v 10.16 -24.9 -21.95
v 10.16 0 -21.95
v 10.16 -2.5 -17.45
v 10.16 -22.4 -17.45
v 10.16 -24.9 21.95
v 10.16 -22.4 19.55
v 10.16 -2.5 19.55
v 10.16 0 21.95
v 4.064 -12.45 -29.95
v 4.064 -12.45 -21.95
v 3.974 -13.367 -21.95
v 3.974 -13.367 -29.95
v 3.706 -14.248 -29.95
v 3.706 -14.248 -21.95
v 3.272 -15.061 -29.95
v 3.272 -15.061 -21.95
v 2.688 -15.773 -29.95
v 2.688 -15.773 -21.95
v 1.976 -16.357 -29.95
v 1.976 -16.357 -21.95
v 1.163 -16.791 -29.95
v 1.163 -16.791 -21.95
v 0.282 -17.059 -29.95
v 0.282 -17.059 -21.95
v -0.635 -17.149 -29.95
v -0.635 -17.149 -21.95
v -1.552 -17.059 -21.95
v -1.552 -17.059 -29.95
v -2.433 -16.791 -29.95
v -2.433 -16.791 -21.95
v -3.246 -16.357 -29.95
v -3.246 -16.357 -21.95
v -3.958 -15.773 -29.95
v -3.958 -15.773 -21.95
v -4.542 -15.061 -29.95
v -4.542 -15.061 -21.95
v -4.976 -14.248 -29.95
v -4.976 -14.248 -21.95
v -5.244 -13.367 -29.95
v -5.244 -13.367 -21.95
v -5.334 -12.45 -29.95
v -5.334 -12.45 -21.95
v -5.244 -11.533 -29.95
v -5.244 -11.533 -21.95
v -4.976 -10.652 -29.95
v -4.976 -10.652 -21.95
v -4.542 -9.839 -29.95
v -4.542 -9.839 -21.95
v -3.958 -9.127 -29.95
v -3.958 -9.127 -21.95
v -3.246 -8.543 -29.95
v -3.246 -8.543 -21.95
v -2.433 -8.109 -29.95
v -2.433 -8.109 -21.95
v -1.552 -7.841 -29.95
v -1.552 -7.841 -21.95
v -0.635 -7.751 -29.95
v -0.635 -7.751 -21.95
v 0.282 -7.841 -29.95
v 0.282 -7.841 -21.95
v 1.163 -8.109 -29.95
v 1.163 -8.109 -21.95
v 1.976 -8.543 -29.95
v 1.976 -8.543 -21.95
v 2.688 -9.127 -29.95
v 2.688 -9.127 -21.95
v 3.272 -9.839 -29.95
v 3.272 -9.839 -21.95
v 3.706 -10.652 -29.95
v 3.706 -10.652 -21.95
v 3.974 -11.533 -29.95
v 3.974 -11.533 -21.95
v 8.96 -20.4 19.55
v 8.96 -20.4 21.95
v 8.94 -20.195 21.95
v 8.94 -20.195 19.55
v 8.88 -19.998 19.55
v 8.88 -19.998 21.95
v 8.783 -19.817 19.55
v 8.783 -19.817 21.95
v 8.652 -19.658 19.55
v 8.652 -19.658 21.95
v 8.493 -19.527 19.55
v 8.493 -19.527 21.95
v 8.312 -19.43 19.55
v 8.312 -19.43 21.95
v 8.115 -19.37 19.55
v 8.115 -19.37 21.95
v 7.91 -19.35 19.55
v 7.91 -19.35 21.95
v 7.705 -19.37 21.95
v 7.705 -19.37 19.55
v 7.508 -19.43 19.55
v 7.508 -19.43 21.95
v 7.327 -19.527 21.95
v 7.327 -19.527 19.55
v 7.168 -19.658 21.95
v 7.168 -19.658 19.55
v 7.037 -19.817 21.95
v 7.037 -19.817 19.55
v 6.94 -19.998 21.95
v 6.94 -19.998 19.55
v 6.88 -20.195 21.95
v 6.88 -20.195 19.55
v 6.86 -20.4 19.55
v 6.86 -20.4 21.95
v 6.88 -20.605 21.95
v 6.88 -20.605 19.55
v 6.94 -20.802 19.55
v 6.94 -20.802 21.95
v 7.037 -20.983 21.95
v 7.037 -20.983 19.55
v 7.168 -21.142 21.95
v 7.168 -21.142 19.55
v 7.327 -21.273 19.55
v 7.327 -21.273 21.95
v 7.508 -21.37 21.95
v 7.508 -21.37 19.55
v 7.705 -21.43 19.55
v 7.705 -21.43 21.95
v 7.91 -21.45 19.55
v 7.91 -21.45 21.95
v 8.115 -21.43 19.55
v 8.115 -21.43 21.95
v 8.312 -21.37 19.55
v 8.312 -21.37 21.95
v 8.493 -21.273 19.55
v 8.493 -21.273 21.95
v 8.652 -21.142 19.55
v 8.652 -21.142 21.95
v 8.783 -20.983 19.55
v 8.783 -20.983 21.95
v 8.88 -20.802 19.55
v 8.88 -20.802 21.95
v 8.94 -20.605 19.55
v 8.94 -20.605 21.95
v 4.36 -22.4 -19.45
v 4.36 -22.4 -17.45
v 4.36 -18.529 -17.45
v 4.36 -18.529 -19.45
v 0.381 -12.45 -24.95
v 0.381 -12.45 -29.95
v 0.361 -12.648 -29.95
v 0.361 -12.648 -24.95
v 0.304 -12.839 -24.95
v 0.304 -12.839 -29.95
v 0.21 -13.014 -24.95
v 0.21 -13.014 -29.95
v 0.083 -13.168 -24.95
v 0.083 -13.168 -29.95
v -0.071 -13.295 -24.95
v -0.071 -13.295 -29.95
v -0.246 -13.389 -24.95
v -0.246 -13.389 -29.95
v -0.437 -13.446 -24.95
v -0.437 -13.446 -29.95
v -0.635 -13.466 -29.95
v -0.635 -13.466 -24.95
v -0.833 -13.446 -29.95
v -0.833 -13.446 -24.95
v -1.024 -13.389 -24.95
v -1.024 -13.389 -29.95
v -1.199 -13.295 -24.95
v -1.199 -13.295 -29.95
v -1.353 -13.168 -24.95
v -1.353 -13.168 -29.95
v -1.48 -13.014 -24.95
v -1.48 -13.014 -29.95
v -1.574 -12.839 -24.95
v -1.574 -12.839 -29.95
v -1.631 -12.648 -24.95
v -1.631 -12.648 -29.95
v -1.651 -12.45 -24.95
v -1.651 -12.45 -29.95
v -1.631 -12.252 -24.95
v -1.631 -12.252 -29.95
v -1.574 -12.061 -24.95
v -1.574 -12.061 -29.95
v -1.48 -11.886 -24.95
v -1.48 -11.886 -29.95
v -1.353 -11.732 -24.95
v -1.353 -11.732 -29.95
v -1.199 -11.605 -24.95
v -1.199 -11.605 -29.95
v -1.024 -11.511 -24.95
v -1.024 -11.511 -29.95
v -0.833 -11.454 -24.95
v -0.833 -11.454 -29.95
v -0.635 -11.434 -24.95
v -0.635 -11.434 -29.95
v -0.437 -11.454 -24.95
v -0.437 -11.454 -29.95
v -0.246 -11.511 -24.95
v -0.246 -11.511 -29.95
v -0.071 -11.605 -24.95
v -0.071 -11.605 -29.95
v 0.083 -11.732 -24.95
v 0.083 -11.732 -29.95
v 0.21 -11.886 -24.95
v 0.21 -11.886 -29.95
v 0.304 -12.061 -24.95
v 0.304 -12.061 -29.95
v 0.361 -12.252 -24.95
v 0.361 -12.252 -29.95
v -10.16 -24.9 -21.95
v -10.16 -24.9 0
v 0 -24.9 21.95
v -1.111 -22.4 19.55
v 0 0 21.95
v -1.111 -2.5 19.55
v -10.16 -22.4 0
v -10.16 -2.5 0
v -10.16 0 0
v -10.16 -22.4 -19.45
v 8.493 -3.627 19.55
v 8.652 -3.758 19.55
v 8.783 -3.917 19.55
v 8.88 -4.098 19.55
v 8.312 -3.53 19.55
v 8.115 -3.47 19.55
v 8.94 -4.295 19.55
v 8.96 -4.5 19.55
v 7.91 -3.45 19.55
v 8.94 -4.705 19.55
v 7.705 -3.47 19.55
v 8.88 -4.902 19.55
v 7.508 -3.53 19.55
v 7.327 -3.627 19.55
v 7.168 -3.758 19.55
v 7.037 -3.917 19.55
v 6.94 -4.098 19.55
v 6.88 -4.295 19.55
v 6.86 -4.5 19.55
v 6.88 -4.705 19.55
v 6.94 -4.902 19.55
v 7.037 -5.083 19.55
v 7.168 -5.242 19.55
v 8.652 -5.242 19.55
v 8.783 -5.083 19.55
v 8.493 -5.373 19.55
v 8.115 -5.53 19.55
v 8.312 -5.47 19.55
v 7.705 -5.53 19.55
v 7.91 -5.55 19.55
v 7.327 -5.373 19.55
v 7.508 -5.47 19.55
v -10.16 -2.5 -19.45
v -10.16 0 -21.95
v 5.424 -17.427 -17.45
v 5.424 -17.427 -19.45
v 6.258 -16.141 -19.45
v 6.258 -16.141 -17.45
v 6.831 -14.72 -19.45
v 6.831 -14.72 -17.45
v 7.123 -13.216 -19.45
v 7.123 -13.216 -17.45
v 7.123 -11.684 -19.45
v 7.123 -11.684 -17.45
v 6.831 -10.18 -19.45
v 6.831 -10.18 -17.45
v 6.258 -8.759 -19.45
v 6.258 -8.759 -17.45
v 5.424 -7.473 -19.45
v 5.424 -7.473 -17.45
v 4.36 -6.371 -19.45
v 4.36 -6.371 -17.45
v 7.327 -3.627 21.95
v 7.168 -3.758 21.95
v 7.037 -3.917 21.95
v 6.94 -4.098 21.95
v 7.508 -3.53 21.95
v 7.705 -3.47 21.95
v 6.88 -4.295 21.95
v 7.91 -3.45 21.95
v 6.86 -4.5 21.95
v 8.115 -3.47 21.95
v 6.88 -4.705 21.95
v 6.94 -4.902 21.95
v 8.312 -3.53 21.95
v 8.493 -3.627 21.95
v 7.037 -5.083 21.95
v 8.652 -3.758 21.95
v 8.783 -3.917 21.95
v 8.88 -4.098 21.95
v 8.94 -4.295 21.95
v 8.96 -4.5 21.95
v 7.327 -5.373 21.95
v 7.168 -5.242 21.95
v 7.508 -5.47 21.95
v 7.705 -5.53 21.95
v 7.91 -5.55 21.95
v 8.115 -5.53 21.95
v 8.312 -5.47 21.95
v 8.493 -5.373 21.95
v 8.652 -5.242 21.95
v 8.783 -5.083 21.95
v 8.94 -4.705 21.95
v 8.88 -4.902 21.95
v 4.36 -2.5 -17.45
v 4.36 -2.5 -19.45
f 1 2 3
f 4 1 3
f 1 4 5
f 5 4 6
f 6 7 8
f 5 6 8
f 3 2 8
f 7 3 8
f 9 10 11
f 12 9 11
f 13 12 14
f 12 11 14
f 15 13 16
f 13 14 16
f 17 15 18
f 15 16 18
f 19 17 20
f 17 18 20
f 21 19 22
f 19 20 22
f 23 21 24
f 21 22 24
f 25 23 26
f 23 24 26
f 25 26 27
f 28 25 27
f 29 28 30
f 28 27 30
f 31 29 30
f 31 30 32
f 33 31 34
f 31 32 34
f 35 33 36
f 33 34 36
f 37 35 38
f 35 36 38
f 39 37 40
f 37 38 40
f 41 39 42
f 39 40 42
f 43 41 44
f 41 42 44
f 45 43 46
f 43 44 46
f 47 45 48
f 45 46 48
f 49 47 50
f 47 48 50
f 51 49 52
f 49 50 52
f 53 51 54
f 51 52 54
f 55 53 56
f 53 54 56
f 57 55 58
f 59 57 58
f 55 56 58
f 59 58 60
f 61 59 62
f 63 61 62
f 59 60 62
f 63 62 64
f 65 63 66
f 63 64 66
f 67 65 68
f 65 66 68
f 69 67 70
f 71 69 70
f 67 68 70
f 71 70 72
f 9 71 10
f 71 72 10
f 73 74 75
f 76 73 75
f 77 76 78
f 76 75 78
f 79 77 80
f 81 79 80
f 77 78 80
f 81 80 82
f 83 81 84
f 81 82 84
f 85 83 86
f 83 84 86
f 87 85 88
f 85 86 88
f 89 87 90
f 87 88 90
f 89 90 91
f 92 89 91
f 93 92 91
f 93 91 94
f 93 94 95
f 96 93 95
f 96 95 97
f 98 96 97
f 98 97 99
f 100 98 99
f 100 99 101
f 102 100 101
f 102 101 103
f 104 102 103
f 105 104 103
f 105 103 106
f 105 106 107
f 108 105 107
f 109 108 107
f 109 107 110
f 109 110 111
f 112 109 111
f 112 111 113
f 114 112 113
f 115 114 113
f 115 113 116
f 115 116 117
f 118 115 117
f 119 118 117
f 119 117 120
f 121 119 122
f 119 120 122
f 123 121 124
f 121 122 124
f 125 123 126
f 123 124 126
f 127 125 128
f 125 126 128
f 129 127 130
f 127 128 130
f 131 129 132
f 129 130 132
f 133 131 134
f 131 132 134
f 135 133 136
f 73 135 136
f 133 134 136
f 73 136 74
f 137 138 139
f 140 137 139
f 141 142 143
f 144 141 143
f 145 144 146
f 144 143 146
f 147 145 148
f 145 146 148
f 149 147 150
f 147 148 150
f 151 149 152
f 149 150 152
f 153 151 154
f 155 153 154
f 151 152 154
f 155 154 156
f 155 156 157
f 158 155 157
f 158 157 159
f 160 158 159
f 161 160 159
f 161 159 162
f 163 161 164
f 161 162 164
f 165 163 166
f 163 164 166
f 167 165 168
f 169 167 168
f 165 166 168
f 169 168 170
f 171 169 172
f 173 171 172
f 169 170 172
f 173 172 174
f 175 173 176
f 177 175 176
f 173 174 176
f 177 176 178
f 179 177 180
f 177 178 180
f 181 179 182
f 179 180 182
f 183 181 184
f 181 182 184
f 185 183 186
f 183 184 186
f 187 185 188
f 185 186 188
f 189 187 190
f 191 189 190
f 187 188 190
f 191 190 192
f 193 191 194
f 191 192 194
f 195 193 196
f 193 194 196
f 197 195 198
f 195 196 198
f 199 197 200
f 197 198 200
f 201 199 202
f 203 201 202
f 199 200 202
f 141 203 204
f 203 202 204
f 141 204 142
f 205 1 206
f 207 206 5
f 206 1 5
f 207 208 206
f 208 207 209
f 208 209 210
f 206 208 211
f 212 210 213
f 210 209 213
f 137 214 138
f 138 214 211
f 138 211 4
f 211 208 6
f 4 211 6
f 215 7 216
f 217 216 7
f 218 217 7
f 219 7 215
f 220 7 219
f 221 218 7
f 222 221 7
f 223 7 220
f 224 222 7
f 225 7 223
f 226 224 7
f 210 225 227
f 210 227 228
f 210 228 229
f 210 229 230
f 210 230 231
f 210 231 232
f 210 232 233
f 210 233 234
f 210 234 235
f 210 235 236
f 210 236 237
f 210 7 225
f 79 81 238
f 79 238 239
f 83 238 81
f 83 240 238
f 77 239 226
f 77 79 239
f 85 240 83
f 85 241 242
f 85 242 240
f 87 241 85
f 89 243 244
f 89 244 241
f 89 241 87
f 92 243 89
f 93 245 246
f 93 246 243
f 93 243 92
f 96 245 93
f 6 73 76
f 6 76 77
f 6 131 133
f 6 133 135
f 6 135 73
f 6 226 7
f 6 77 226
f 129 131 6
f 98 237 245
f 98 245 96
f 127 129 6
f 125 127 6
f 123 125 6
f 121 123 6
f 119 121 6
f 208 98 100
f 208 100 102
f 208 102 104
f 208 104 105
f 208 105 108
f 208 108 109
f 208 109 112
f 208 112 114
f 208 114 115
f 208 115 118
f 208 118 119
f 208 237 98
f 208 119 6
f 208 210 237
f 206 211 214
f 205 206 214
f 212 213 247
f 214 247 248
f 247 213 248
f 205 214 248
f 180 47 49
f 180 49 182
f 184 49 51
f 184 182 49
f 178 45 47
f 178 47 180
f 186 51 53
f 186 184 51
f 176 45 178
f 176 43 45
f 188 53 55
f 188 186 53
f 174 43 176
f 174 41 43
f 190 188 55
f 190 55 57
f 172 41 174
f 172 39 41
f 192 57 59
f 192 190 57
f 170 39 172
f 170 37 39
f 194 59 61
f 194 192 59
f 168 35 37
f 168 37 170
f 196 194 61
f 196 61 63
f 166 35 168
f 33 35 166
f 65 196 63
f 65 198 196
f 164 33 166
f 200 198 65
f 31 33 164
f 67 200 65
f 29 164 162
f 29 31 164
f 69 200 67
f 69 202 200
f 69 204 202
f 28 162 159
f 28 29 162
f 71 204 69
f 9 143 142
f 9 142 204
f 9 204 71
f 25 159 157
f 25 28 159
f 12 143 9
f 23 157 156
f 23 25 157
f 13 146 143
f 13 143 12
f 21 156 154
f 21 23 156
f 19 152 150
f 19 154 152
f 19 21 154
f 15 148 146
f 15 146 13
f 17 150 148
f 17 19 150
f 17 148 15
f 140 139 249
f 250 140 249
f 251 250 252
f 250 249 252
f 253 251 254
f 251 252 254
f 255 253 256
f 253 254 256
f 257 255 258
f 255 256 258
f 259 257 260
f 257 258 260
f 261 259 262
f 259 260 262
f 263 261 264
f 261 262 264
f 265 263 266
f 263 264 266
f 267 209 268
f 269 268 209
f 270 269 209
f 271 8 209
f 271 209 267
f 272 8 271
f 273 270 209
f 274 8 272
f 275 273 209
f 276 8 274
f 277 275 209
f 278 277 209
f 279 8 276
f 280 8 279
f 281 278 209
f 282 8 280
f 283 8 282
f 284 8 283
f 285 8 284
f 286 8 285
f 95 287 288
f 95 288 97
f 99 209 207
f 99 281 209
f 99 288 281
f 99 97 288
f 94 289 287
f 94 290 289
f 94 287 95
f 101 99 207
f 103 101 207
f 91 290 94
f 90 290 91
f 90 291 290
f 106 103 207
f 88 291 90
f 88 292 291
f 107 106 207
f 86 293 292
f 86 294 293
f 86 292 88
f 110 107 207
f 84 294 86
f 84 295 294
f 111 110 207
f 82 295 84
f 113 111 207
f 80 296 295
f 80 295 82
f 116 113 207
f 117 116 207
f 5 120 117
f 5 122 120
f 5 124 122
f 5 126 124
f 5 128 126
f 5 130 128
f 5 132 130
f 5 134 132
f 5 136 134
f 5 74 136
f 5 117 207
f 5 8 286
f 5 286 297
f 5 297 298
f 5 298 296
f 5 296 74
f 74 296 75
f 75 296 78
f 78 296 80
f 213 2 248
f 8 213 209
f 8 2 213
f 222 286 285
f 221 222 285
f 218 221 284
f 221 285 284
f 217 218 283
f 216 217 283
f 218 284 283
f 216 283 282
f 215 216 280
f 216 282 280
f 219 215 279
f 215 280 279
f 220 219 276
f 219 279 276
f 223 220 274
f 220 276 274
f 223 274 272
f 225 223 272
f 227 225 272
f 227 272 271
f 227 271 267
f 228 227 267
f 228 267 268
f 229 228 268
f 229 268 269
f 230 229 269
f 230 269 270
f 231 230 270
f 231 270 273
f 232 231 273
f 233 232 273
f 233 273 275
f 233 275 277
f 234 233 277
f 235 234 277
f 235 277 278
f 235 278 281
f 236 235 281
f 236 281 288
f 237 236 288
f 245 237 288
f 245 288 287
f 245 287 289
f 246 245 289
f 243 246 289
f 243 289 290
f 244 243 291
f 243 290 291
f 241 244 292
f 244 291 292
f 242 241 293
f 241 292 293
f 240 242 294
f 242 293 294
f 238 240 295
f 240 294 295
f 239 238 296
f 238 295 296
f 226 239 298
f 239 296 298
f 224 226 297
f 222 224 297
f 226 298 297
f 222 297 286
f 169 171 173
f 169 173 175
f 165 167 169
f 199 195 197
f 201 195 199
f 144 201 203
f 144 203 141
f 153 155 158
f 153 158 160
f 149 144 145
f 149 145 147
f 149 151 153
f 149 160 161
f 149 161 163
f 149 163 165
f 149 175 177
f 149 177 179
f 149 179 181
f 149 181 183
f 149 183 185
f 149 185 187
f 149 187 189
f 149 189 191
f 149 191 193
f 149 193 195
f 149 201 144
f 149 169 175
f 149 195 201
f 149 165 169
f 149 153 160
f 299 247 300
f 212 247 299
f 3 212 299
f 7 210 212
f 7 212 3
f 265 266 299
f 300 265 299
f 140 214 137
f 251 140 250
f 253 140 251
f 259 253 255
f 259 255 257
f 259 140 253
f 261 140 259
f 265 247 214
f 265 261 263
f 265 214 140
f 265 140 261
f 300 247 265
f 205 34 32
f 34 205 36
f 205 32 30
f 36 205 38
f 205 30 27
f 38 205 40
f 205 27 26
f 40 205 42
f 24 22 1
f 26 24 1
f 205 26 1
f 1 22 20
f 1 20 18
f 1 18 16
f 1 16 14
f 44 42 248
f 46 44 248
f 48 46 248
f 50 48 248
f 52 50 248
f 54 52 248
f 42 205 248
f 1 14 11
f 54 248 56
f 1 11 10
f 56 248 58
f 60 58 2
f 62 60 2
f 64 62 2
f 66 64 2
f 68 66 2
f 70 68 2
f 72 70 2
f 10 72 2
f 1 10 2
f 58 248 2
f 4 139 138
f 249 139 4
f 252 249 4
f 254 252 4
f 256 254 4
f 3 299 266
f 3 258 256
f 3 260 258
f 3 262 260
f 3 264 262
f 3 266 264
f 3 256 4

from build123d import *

# Parameters (mm, degrees)
F1_DEPTH  = 24.9
F2_W      = 19.9
F2_H      = 36.5
F3_DEPTH  = 25.4
F4_W      = 24.9
F4_H      = 5
F4_H_2    = 7.5
F5_DEPTH  = 2.5
F7_DEPTH  = 2.5
F8_R      = 1.05
F9_DEPTH  = 25.4
F10_R     = 4.699
F11_DEPTH = 8
F12_R     = 1.016
F13_DEPTH = 5
F14_W     = 2.5
F14_H     = 7.5
F14_H_2   = 5
F15_DEPTH = 25.4
F17_DEPTH = 25.4
F18_W     = 5.8
F18_H     = 19.9
F19_DEPTH = 0.5


with BuildPart() as f1:
    # F0 (on Front) → F1 (new body)
    with BuildSketch(Plane.XZ):
        Polygon((10.16, 21.95), (0, 21.95), (-10.16, 21.95), (-10.16, -21.95), (10.16, -21.95), (10.16, 0), align=None)
    extrude(amount=F1_DEPTH)

    # F2 (on face) → F3 (cut)
    with BuildSketch(Plane(origin=(-10.16, 0, 0), x_dir=(0, -1, 0), z_dir=(-1, 0, 0))):
        with Locations((12.45, 1.3)):
            Rectangle(F2_W, F2_H)
    extrude(amount=-F3_DEPTH, mode=Mode.SUBTRACT)

    # F4 (on face) → F5 (join)
    with BuildSketch(Plane(origin=(-10.16, 0, 0), x_dir=(0, -1, 0), z_dir=(-1, 0, 0))):
        with Locations((12.45, 19.45)):
            Rectangle(F4_W, F4_H)
        with Locations((12.45, -18.2)):
            Rectangle(F4_W, F4_H_2)
    extrude(amount=F5_DEPTH)

    # F6 (on face) → F7 (cut)
    with BuildSketch(Plane.XY.offset(-16.95)):
        with BuildLine():
            Line((4.36, -6.370526), (4.36, -2.5))
            Line((4.36, -2.5), (-10.16, -2.5))
            Line((-10.16, -2.5), (-10.16, -22.4))
            Line((-10.16, -22.4), (4.36, -22.4))
            Line((4.36, -22.4), (4.36, -18.529474))
            ThreePointArc((4.36, -18.529474), (7.16, -12.45), (4.36, -6.370526))
        make_face()
    extrude(amount=-F7_DEPTH, mode=Mode.SUBTRACT)

    # F8 (on face) → F9 (cut)
    with BuildSketch(Plane.XY.offset(21.95)):
        with Locations((7.91, -4.5)):
            Circle(F8_R)
        with Locations((7.91, -20.4)):
            Circle(F8_R)
    extrude(amount=-F9_DEPTH, mode=Mode.SUBTRACT)

    # F10 (on face) → F11 (join)
    with BuildSketch(Plane(origin=(0, 0, -21.95), x_dir=(1, 0, 0), z_dir=(0, 0, -1))):
        with Locations((-0.635, 12.45)):
            Circle(F10_R)
    extrude(amount=F11_DEPTH)

    # F12 (on face) → F13 (cut)
    with BuildSketch(Plane(origin=(0, 0, -29.95), x_dir=(1, 0, 0), z_dir=(0, 0, -1))):
        with Locations((-0.635, 12.45)):
            Circle(F12_R)
    extrude(amount=-F13_DEPTH, mode=Mode.SUBTRACT)

    # F14 (on face) → F15 (cut)
    with BuildSketch(Plane.XZ.offset(24.9)):
        with Locations((-11.41, -18.2)):
            Rectangle(F14_W, F14_H)
        with Locations((-11.41, 19.45)):
            Rectangle(F14_W, F14_H_2)
    extrude(amount=-F15_DEPTH, mode=Mode.SUBTRACT)

    # F16 (on face) → F17 (cut)
    with BuildSketch(Plane(origin=(0, 0, 0), x_dir=(-1, 0, 0), z_dir=(0, 1, 0))):
        Polygon((10.16, 21.95), (0, 21.95), (10.16, 0), align=None)
    extrude(amount=-F17_DEPTH, mode=Mode.SUBTRACT)

    # F18 (on face) → F19 (cut)
    with BuildSketch(Plane.XY.offset(-16.95)):
        with Locations((7.26, -12.45)):
            Rectangle(F18_W, F18_H)
    extrude(amount=-F19_DEPTH, mode=Mode.SUBTRACT)


solid = f1.part
